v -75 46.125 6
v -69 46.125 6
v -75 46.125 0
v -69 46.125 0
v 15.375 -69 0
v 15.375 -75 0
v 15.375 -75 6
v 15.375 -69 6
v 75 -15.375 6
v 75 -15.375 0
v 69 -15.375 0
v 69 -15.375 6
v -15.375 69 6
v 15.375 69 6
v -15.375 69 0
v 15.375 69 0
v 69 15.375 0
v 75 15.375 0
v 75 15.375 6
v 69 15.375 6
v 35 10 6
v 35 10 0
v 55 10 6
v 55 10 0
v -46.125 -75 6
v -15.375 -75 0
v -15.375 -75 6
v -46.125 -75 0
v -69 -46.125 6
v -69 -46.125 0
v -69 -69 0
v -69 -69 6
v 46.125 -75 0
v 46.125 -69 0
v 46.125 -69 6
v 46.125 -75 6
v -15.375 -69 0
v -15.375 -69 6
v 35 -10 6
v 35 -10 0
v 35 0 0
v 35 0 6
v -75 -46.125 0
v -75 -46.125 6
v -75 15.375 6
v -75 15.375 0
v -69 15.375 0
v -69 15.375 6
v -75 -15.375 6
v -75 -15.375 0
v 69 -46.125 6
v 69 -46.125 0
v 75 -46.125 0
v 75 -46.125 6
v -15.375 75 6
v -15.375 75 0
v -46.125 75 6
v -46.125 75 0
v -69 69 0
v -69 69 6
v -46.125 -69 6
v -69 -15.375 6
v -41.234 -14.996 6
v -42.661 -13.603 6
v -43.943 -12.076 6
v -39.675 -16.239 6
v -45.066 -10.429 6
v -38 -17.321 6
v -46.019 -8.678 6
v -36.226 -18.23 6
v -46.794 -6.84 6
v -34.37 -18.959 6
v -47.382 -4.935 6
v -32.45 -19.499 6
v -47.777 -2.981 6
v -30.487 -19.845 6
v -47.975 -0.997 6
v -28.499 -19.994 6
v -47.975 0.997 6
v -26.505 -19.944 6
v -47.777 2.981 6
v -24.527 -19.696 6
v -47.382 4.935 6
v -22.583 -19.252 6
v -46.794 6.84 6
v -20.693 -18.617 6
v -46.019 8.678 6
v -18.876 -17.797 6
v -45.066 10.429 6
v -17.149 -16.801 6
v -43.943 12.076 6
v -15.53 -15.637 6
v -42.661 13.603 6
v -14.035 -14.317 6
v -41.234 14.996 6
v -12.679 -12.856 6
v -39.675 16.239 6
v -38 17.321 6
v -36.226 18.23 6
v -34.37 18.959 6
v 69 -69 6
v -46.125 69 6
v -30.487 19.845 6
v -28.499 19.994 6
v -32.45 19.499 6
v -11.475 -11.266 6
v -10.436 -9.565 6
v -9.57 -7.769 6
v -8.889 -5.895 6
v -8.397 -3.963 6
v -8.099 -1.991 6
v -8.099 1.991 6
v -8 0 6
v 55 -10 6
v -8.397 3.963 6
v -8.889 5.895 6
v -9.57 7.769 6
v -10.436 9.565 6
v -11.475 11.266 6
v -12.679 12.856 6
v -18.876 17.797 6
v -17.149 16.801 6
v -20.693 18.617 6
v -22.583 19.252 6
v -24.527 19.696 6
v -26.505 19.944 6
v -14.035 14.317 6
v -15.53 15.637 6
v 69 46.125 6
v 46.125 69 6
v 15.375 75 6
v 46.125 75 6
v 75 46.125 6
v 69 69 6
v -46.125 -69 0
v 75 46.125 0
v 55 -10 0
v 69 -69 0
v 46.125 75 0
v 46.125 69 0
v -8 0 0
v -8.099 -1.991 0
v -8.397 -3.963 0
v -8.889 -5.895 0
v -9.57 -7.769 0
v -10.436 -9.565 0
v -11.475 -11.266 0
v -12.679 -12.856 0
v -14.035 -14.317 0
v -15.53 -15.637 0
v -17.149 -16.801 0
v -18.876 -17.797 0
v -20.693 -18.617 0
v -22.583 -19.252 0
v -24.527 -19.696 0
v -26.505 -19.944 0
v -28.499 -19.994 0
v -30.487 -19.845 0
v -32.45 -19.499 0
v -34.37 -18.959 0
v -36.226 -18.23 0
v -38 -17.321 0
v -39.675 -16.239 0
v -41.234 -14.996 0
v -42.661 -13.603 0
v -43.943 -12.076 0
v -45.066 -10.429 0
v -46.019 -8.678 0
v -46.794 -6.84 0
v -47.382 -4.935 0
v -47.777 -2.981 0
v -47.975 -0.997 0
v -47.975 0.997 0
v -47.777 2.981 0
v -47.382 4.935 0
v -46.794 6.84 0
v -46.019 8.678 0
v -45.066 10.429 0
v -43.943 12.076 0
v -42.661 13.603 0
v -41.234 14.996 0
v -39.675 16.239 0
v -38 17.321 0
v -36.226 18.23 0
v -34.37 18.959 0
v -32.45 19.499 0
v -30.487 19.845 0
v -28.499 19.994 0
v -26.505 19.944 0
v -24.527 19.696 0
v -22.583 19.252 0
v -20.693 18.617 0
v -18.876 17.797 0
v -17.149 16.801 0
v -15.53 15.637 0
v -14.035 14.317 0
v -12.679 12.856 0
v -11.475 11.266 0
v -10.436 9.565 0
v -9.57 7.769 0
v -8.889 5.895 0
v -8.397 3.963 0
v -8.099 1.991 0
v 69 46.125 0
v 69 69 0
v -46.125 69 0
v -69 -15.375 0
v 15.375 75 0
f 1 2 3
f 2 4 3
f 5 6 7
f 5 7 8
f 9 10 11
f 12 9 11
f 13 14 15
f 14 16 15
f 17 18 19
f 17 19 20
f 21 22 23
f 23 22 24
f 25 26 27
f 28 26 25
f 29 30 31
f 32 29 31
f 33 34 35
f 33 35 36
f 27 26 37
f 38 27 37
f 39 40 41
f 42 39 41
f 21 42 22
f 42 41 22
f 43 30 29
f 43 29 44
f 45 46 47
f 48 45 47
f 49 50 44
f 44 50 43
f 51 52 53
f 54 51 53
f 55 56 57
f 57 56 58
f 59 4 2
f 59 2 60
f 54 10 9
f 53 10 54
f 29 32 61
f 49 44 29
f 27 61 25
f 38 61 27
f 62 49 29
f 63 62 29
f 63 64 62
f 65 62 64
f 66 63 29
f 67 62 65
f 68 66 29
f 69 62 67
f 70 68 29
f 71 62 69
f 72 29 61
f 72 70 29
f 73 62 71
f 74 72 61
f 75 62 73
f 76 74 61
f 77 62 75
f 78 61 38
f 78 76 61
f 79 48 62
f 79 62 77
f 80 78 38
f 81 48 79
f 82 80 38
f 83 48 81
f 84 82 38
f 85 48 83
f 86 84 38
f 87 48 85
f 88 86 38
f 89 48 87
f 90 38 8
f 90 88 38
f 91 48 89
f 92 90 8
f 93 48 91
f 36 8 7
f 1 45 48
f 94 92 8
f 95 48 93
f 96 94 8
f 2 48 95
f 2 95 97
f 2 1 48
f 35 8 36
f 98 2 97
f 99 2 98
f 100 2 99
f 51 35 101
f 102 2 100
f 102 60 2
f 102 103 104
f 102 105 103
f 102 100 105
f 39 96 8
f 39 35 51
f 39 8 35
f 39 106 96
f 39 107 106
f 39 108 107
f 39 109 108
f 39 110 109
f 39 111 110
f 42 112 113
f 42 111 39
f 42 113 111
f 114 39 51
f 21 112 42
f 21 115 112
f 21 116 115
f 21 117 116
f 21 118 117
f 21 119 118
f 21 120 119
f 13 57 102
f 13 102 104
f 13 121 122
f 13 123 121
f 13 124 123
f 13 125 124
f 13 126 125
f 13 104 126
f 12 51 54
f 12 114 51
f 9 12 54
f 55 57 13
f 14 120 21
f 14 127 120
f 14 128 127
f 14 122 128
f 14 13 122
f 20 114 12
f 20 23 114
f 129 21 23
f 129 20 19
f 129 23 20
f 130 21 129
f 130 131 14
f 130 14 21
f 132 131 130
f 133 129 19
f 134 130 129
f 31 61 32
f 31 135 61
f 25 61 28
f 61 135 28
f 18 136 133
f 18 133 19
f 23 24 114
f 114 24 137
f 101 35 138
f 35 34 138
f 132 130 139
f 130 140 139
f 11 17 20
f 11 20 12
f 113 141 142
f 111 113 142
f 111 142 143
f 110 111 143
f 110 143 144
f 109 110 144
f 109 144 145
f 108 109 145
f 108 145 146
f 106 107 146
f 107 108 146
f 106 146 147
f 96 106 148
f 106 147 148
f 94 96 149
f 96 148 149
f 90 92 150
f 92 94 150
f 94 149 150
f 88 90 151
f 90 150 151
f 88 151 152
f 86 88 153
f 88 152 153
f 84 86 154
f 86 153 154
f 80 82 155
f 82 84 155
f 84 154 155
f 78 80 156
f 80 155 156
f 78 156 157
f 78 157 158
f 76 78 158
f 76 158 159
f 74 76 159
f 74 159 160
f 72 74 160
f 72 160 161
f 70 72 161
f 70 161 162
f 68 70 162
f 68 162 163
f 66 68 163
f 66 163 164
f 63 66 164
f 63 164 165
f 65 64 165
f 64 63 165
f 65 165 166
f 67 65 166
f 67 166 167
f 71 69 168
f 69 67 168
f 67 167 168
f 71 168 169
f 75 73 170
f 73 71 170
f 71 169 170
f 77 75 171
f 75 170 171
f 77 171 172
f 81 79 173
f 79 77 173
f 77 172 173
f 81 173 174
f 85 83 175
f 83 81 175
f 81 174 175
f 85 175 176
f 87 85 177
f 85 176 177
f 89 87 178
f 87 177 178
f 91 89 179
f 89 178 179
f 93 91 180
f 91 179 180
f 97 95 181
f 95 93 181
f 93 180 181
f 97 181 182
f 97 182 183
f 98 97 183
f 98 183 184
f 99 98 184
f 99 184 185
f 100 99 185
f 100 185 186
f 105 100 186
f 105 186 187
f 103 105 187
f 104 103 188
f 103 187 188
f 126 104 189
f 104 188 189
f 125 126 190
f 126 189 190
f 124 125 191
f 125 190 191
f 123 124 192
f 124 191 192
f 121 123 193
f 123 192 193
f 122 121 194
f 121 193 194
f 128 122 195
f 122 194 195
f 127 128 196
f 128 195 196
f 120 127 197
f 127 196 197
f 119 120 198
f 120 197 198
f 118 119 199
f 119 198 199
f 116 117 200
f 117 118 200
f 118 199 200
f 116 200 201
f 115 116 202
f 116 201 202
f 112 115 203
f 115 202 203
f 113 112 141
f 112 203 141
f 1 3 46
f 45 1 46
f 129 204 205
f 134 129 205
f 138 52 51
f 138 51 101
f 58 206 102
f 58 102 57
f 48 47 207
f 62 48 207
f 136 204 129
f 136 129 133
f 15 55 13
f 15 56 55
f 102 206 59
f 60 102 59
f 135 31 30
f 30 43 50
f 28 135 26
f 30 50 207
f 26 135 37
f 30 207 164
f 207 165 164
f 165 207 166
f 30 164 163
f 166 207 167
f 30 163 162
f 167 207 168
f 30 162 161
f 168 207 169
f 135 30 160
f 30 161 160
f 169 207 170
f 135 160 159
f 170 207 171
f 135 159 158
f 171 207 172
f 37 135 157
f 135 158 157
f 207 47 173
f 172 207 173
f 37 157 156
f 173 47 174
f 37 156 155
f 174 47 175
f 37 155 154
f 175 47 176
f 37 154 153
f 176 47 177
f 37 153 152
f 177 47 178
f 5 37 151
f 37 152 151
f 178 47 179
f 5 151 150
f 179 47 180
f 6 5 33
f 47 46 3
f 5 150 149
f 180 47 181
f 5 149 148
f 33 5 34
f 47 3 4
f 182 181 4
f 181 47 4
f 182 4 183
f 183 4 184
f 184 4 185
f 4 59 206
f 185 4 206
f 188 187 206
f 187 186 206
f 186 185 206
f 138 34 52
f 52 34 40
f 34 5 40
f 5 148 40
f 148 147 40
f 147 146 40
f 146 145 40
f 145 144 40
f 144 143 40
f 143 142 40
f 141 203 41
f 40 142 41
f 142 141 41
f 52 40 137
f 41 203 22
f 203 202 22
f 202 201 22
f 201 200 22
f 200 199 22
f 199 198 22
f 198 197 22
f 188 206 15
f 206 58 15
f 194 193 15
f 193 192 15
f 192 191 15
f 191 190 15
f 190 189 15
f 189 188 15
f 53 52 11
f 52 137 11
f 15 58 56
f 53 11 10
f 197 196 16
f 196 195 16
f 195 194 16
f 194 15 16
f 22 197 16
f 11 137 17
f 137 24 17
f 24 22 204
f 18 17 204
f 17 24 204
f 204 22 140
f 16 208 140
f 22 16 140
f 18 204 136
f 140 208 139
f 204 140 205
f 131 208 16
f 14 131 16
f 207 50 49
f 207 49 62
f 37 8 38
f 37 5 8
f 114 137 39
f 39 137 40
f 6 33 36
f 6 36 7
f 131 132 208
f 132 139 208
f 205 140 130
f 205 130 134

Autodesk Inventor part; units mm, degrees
ref_plane "YZ Plane" through (0, 0, 0) normal (1, 0, 0) x (0, 1, 0)
ref_plane "XZ Plane" through (0, 0, 0) normal (0, 1, 0) x (-1, 0, 0)
ref_plane "XY Plane" through (0, 0, 0) normal (0, 0, 1) x (1, 0, 0)
sketch "Sketch1" plane through (0, 0, 0) normal (0, 0, 1) x (1, 0, 0)
  line L0 (-75, -15.375) -> (-69, -15.375)
  line L1 (-69, -46.125) -> (-75, -46.125)
  line L2 (-69, 46.125) -> (-75, 46.125)
  line L3 (-75, 15.375) -> (-69, 15.375)
  line L4 (-69, 46.125) -> (-69, 69)
  line L5 (-75, 46.125) -> (-75, 15.375)
  line L6 (-69, 15.375) -> (-69, -15.375)
  line L7 (-75, -15.375) -> (-75, -46.125)
  line L8 (-69, -46.125) -> (-69, -69)
  line L9 (0, 0) -> (0, 15.375)
  line L10 (0, 0) -> (0, -46.125)
  line L11 (69, 15.375) -> (69, -15.375)
  line L12 (75, 15.375) -> (69, 15.375)
  line L13 (75, 46.125) -> (75, 15.375)
  line L14 (69, 46.125) -> (75, 46.125)
  line L15 (69, 46.125) -> (69, 69)
  line L16 (75, -15.375) -> (69, -15.375)
  line L17 (75, -15.375) -> (75, -46.125)
  line L18 (69, -46.125) -> (75, -46.125)
  line L19 (69, -46.125) -> (69, -69)
  line L20 (0, 0) -> (92.4518, 92.4518)
  line L21 (0, 0) -> (130.7466, 0) construction
  line L22 (0, 0) -> (109.2471, 0) construction
  line L23 (0, 0) -> (102.0745, -102.0745)
  line L24 (0, 0) -> (162.0274, 0) construction
  line L25 (15.375, 69) -> (-15.375, 69)
  line L26 (15.375, 75) -> (15.375, 69)
  line L27 (46.125, 75) -> (15.375, 75)
  line L28 (46.125, 69) -> (46.125, 75)
  line L29 (46.125, 69) -> (69, 69)
  line L30 (-15.375, 75) -> (-15.375, 69)
  line L31 (-15.375, 75) -> (-46.125, 75)
  line L32 (-46.125, 69) -> (-46.125, 75)
  line L33 (-46.125, 69) -> (-69, 69)
  line L34 (-15.375, -75) -> (-15.375, -69)
  line L35 (-46.125, -69) -> (-46.125, -75)
  line L36 (46.125, -69) -> (46.125, -75)
  line L37 (15.375, -75) -> (15.375, -69)
  line L38 (46.125, -69) -> (69, -69)
  line L39 (46.125, -75) -> (15.375, -75)
  line L40 (15.375, -69) -> (-15.375, -69)
  line L41 (-15.375, -75) -> (-46.125, -75)
  line L42 (-46.125, -69) -> (-69, -69)
  line L43 (0, 0) -> (-28, 0)
  circle A0 centre (-28, 0) radius 20
  line L44 (0, 0) -> (45, 0)
  line L45 (35, 10) -> (55, 10)
  line L46 (55, 10) -> (55, -10)
  line L47 (55, -10) -> (35, -10)
  line L48 (35, -10) -> (35, 10)
  line L49 (35, 10) -> (55, -10) construction
  line L50 (55, 10) -> (35, -10) construction
  point P0 (0, 0)
  point P1 (-69, -75)
  point P2 (-69, 75)
  point P3 (69, -75)
  point P4 (69, 75)
  dimension "d8" = 45
  dimension "d13" = 28
  dimension "d14" = 40
  dimension "d15" = 45
  dimension "d16" = 20
  dimension "d17" = 20
extrude "Extrusion1" add sketch "Sketch1" along normal blind 6
properties part number "Bottom"
